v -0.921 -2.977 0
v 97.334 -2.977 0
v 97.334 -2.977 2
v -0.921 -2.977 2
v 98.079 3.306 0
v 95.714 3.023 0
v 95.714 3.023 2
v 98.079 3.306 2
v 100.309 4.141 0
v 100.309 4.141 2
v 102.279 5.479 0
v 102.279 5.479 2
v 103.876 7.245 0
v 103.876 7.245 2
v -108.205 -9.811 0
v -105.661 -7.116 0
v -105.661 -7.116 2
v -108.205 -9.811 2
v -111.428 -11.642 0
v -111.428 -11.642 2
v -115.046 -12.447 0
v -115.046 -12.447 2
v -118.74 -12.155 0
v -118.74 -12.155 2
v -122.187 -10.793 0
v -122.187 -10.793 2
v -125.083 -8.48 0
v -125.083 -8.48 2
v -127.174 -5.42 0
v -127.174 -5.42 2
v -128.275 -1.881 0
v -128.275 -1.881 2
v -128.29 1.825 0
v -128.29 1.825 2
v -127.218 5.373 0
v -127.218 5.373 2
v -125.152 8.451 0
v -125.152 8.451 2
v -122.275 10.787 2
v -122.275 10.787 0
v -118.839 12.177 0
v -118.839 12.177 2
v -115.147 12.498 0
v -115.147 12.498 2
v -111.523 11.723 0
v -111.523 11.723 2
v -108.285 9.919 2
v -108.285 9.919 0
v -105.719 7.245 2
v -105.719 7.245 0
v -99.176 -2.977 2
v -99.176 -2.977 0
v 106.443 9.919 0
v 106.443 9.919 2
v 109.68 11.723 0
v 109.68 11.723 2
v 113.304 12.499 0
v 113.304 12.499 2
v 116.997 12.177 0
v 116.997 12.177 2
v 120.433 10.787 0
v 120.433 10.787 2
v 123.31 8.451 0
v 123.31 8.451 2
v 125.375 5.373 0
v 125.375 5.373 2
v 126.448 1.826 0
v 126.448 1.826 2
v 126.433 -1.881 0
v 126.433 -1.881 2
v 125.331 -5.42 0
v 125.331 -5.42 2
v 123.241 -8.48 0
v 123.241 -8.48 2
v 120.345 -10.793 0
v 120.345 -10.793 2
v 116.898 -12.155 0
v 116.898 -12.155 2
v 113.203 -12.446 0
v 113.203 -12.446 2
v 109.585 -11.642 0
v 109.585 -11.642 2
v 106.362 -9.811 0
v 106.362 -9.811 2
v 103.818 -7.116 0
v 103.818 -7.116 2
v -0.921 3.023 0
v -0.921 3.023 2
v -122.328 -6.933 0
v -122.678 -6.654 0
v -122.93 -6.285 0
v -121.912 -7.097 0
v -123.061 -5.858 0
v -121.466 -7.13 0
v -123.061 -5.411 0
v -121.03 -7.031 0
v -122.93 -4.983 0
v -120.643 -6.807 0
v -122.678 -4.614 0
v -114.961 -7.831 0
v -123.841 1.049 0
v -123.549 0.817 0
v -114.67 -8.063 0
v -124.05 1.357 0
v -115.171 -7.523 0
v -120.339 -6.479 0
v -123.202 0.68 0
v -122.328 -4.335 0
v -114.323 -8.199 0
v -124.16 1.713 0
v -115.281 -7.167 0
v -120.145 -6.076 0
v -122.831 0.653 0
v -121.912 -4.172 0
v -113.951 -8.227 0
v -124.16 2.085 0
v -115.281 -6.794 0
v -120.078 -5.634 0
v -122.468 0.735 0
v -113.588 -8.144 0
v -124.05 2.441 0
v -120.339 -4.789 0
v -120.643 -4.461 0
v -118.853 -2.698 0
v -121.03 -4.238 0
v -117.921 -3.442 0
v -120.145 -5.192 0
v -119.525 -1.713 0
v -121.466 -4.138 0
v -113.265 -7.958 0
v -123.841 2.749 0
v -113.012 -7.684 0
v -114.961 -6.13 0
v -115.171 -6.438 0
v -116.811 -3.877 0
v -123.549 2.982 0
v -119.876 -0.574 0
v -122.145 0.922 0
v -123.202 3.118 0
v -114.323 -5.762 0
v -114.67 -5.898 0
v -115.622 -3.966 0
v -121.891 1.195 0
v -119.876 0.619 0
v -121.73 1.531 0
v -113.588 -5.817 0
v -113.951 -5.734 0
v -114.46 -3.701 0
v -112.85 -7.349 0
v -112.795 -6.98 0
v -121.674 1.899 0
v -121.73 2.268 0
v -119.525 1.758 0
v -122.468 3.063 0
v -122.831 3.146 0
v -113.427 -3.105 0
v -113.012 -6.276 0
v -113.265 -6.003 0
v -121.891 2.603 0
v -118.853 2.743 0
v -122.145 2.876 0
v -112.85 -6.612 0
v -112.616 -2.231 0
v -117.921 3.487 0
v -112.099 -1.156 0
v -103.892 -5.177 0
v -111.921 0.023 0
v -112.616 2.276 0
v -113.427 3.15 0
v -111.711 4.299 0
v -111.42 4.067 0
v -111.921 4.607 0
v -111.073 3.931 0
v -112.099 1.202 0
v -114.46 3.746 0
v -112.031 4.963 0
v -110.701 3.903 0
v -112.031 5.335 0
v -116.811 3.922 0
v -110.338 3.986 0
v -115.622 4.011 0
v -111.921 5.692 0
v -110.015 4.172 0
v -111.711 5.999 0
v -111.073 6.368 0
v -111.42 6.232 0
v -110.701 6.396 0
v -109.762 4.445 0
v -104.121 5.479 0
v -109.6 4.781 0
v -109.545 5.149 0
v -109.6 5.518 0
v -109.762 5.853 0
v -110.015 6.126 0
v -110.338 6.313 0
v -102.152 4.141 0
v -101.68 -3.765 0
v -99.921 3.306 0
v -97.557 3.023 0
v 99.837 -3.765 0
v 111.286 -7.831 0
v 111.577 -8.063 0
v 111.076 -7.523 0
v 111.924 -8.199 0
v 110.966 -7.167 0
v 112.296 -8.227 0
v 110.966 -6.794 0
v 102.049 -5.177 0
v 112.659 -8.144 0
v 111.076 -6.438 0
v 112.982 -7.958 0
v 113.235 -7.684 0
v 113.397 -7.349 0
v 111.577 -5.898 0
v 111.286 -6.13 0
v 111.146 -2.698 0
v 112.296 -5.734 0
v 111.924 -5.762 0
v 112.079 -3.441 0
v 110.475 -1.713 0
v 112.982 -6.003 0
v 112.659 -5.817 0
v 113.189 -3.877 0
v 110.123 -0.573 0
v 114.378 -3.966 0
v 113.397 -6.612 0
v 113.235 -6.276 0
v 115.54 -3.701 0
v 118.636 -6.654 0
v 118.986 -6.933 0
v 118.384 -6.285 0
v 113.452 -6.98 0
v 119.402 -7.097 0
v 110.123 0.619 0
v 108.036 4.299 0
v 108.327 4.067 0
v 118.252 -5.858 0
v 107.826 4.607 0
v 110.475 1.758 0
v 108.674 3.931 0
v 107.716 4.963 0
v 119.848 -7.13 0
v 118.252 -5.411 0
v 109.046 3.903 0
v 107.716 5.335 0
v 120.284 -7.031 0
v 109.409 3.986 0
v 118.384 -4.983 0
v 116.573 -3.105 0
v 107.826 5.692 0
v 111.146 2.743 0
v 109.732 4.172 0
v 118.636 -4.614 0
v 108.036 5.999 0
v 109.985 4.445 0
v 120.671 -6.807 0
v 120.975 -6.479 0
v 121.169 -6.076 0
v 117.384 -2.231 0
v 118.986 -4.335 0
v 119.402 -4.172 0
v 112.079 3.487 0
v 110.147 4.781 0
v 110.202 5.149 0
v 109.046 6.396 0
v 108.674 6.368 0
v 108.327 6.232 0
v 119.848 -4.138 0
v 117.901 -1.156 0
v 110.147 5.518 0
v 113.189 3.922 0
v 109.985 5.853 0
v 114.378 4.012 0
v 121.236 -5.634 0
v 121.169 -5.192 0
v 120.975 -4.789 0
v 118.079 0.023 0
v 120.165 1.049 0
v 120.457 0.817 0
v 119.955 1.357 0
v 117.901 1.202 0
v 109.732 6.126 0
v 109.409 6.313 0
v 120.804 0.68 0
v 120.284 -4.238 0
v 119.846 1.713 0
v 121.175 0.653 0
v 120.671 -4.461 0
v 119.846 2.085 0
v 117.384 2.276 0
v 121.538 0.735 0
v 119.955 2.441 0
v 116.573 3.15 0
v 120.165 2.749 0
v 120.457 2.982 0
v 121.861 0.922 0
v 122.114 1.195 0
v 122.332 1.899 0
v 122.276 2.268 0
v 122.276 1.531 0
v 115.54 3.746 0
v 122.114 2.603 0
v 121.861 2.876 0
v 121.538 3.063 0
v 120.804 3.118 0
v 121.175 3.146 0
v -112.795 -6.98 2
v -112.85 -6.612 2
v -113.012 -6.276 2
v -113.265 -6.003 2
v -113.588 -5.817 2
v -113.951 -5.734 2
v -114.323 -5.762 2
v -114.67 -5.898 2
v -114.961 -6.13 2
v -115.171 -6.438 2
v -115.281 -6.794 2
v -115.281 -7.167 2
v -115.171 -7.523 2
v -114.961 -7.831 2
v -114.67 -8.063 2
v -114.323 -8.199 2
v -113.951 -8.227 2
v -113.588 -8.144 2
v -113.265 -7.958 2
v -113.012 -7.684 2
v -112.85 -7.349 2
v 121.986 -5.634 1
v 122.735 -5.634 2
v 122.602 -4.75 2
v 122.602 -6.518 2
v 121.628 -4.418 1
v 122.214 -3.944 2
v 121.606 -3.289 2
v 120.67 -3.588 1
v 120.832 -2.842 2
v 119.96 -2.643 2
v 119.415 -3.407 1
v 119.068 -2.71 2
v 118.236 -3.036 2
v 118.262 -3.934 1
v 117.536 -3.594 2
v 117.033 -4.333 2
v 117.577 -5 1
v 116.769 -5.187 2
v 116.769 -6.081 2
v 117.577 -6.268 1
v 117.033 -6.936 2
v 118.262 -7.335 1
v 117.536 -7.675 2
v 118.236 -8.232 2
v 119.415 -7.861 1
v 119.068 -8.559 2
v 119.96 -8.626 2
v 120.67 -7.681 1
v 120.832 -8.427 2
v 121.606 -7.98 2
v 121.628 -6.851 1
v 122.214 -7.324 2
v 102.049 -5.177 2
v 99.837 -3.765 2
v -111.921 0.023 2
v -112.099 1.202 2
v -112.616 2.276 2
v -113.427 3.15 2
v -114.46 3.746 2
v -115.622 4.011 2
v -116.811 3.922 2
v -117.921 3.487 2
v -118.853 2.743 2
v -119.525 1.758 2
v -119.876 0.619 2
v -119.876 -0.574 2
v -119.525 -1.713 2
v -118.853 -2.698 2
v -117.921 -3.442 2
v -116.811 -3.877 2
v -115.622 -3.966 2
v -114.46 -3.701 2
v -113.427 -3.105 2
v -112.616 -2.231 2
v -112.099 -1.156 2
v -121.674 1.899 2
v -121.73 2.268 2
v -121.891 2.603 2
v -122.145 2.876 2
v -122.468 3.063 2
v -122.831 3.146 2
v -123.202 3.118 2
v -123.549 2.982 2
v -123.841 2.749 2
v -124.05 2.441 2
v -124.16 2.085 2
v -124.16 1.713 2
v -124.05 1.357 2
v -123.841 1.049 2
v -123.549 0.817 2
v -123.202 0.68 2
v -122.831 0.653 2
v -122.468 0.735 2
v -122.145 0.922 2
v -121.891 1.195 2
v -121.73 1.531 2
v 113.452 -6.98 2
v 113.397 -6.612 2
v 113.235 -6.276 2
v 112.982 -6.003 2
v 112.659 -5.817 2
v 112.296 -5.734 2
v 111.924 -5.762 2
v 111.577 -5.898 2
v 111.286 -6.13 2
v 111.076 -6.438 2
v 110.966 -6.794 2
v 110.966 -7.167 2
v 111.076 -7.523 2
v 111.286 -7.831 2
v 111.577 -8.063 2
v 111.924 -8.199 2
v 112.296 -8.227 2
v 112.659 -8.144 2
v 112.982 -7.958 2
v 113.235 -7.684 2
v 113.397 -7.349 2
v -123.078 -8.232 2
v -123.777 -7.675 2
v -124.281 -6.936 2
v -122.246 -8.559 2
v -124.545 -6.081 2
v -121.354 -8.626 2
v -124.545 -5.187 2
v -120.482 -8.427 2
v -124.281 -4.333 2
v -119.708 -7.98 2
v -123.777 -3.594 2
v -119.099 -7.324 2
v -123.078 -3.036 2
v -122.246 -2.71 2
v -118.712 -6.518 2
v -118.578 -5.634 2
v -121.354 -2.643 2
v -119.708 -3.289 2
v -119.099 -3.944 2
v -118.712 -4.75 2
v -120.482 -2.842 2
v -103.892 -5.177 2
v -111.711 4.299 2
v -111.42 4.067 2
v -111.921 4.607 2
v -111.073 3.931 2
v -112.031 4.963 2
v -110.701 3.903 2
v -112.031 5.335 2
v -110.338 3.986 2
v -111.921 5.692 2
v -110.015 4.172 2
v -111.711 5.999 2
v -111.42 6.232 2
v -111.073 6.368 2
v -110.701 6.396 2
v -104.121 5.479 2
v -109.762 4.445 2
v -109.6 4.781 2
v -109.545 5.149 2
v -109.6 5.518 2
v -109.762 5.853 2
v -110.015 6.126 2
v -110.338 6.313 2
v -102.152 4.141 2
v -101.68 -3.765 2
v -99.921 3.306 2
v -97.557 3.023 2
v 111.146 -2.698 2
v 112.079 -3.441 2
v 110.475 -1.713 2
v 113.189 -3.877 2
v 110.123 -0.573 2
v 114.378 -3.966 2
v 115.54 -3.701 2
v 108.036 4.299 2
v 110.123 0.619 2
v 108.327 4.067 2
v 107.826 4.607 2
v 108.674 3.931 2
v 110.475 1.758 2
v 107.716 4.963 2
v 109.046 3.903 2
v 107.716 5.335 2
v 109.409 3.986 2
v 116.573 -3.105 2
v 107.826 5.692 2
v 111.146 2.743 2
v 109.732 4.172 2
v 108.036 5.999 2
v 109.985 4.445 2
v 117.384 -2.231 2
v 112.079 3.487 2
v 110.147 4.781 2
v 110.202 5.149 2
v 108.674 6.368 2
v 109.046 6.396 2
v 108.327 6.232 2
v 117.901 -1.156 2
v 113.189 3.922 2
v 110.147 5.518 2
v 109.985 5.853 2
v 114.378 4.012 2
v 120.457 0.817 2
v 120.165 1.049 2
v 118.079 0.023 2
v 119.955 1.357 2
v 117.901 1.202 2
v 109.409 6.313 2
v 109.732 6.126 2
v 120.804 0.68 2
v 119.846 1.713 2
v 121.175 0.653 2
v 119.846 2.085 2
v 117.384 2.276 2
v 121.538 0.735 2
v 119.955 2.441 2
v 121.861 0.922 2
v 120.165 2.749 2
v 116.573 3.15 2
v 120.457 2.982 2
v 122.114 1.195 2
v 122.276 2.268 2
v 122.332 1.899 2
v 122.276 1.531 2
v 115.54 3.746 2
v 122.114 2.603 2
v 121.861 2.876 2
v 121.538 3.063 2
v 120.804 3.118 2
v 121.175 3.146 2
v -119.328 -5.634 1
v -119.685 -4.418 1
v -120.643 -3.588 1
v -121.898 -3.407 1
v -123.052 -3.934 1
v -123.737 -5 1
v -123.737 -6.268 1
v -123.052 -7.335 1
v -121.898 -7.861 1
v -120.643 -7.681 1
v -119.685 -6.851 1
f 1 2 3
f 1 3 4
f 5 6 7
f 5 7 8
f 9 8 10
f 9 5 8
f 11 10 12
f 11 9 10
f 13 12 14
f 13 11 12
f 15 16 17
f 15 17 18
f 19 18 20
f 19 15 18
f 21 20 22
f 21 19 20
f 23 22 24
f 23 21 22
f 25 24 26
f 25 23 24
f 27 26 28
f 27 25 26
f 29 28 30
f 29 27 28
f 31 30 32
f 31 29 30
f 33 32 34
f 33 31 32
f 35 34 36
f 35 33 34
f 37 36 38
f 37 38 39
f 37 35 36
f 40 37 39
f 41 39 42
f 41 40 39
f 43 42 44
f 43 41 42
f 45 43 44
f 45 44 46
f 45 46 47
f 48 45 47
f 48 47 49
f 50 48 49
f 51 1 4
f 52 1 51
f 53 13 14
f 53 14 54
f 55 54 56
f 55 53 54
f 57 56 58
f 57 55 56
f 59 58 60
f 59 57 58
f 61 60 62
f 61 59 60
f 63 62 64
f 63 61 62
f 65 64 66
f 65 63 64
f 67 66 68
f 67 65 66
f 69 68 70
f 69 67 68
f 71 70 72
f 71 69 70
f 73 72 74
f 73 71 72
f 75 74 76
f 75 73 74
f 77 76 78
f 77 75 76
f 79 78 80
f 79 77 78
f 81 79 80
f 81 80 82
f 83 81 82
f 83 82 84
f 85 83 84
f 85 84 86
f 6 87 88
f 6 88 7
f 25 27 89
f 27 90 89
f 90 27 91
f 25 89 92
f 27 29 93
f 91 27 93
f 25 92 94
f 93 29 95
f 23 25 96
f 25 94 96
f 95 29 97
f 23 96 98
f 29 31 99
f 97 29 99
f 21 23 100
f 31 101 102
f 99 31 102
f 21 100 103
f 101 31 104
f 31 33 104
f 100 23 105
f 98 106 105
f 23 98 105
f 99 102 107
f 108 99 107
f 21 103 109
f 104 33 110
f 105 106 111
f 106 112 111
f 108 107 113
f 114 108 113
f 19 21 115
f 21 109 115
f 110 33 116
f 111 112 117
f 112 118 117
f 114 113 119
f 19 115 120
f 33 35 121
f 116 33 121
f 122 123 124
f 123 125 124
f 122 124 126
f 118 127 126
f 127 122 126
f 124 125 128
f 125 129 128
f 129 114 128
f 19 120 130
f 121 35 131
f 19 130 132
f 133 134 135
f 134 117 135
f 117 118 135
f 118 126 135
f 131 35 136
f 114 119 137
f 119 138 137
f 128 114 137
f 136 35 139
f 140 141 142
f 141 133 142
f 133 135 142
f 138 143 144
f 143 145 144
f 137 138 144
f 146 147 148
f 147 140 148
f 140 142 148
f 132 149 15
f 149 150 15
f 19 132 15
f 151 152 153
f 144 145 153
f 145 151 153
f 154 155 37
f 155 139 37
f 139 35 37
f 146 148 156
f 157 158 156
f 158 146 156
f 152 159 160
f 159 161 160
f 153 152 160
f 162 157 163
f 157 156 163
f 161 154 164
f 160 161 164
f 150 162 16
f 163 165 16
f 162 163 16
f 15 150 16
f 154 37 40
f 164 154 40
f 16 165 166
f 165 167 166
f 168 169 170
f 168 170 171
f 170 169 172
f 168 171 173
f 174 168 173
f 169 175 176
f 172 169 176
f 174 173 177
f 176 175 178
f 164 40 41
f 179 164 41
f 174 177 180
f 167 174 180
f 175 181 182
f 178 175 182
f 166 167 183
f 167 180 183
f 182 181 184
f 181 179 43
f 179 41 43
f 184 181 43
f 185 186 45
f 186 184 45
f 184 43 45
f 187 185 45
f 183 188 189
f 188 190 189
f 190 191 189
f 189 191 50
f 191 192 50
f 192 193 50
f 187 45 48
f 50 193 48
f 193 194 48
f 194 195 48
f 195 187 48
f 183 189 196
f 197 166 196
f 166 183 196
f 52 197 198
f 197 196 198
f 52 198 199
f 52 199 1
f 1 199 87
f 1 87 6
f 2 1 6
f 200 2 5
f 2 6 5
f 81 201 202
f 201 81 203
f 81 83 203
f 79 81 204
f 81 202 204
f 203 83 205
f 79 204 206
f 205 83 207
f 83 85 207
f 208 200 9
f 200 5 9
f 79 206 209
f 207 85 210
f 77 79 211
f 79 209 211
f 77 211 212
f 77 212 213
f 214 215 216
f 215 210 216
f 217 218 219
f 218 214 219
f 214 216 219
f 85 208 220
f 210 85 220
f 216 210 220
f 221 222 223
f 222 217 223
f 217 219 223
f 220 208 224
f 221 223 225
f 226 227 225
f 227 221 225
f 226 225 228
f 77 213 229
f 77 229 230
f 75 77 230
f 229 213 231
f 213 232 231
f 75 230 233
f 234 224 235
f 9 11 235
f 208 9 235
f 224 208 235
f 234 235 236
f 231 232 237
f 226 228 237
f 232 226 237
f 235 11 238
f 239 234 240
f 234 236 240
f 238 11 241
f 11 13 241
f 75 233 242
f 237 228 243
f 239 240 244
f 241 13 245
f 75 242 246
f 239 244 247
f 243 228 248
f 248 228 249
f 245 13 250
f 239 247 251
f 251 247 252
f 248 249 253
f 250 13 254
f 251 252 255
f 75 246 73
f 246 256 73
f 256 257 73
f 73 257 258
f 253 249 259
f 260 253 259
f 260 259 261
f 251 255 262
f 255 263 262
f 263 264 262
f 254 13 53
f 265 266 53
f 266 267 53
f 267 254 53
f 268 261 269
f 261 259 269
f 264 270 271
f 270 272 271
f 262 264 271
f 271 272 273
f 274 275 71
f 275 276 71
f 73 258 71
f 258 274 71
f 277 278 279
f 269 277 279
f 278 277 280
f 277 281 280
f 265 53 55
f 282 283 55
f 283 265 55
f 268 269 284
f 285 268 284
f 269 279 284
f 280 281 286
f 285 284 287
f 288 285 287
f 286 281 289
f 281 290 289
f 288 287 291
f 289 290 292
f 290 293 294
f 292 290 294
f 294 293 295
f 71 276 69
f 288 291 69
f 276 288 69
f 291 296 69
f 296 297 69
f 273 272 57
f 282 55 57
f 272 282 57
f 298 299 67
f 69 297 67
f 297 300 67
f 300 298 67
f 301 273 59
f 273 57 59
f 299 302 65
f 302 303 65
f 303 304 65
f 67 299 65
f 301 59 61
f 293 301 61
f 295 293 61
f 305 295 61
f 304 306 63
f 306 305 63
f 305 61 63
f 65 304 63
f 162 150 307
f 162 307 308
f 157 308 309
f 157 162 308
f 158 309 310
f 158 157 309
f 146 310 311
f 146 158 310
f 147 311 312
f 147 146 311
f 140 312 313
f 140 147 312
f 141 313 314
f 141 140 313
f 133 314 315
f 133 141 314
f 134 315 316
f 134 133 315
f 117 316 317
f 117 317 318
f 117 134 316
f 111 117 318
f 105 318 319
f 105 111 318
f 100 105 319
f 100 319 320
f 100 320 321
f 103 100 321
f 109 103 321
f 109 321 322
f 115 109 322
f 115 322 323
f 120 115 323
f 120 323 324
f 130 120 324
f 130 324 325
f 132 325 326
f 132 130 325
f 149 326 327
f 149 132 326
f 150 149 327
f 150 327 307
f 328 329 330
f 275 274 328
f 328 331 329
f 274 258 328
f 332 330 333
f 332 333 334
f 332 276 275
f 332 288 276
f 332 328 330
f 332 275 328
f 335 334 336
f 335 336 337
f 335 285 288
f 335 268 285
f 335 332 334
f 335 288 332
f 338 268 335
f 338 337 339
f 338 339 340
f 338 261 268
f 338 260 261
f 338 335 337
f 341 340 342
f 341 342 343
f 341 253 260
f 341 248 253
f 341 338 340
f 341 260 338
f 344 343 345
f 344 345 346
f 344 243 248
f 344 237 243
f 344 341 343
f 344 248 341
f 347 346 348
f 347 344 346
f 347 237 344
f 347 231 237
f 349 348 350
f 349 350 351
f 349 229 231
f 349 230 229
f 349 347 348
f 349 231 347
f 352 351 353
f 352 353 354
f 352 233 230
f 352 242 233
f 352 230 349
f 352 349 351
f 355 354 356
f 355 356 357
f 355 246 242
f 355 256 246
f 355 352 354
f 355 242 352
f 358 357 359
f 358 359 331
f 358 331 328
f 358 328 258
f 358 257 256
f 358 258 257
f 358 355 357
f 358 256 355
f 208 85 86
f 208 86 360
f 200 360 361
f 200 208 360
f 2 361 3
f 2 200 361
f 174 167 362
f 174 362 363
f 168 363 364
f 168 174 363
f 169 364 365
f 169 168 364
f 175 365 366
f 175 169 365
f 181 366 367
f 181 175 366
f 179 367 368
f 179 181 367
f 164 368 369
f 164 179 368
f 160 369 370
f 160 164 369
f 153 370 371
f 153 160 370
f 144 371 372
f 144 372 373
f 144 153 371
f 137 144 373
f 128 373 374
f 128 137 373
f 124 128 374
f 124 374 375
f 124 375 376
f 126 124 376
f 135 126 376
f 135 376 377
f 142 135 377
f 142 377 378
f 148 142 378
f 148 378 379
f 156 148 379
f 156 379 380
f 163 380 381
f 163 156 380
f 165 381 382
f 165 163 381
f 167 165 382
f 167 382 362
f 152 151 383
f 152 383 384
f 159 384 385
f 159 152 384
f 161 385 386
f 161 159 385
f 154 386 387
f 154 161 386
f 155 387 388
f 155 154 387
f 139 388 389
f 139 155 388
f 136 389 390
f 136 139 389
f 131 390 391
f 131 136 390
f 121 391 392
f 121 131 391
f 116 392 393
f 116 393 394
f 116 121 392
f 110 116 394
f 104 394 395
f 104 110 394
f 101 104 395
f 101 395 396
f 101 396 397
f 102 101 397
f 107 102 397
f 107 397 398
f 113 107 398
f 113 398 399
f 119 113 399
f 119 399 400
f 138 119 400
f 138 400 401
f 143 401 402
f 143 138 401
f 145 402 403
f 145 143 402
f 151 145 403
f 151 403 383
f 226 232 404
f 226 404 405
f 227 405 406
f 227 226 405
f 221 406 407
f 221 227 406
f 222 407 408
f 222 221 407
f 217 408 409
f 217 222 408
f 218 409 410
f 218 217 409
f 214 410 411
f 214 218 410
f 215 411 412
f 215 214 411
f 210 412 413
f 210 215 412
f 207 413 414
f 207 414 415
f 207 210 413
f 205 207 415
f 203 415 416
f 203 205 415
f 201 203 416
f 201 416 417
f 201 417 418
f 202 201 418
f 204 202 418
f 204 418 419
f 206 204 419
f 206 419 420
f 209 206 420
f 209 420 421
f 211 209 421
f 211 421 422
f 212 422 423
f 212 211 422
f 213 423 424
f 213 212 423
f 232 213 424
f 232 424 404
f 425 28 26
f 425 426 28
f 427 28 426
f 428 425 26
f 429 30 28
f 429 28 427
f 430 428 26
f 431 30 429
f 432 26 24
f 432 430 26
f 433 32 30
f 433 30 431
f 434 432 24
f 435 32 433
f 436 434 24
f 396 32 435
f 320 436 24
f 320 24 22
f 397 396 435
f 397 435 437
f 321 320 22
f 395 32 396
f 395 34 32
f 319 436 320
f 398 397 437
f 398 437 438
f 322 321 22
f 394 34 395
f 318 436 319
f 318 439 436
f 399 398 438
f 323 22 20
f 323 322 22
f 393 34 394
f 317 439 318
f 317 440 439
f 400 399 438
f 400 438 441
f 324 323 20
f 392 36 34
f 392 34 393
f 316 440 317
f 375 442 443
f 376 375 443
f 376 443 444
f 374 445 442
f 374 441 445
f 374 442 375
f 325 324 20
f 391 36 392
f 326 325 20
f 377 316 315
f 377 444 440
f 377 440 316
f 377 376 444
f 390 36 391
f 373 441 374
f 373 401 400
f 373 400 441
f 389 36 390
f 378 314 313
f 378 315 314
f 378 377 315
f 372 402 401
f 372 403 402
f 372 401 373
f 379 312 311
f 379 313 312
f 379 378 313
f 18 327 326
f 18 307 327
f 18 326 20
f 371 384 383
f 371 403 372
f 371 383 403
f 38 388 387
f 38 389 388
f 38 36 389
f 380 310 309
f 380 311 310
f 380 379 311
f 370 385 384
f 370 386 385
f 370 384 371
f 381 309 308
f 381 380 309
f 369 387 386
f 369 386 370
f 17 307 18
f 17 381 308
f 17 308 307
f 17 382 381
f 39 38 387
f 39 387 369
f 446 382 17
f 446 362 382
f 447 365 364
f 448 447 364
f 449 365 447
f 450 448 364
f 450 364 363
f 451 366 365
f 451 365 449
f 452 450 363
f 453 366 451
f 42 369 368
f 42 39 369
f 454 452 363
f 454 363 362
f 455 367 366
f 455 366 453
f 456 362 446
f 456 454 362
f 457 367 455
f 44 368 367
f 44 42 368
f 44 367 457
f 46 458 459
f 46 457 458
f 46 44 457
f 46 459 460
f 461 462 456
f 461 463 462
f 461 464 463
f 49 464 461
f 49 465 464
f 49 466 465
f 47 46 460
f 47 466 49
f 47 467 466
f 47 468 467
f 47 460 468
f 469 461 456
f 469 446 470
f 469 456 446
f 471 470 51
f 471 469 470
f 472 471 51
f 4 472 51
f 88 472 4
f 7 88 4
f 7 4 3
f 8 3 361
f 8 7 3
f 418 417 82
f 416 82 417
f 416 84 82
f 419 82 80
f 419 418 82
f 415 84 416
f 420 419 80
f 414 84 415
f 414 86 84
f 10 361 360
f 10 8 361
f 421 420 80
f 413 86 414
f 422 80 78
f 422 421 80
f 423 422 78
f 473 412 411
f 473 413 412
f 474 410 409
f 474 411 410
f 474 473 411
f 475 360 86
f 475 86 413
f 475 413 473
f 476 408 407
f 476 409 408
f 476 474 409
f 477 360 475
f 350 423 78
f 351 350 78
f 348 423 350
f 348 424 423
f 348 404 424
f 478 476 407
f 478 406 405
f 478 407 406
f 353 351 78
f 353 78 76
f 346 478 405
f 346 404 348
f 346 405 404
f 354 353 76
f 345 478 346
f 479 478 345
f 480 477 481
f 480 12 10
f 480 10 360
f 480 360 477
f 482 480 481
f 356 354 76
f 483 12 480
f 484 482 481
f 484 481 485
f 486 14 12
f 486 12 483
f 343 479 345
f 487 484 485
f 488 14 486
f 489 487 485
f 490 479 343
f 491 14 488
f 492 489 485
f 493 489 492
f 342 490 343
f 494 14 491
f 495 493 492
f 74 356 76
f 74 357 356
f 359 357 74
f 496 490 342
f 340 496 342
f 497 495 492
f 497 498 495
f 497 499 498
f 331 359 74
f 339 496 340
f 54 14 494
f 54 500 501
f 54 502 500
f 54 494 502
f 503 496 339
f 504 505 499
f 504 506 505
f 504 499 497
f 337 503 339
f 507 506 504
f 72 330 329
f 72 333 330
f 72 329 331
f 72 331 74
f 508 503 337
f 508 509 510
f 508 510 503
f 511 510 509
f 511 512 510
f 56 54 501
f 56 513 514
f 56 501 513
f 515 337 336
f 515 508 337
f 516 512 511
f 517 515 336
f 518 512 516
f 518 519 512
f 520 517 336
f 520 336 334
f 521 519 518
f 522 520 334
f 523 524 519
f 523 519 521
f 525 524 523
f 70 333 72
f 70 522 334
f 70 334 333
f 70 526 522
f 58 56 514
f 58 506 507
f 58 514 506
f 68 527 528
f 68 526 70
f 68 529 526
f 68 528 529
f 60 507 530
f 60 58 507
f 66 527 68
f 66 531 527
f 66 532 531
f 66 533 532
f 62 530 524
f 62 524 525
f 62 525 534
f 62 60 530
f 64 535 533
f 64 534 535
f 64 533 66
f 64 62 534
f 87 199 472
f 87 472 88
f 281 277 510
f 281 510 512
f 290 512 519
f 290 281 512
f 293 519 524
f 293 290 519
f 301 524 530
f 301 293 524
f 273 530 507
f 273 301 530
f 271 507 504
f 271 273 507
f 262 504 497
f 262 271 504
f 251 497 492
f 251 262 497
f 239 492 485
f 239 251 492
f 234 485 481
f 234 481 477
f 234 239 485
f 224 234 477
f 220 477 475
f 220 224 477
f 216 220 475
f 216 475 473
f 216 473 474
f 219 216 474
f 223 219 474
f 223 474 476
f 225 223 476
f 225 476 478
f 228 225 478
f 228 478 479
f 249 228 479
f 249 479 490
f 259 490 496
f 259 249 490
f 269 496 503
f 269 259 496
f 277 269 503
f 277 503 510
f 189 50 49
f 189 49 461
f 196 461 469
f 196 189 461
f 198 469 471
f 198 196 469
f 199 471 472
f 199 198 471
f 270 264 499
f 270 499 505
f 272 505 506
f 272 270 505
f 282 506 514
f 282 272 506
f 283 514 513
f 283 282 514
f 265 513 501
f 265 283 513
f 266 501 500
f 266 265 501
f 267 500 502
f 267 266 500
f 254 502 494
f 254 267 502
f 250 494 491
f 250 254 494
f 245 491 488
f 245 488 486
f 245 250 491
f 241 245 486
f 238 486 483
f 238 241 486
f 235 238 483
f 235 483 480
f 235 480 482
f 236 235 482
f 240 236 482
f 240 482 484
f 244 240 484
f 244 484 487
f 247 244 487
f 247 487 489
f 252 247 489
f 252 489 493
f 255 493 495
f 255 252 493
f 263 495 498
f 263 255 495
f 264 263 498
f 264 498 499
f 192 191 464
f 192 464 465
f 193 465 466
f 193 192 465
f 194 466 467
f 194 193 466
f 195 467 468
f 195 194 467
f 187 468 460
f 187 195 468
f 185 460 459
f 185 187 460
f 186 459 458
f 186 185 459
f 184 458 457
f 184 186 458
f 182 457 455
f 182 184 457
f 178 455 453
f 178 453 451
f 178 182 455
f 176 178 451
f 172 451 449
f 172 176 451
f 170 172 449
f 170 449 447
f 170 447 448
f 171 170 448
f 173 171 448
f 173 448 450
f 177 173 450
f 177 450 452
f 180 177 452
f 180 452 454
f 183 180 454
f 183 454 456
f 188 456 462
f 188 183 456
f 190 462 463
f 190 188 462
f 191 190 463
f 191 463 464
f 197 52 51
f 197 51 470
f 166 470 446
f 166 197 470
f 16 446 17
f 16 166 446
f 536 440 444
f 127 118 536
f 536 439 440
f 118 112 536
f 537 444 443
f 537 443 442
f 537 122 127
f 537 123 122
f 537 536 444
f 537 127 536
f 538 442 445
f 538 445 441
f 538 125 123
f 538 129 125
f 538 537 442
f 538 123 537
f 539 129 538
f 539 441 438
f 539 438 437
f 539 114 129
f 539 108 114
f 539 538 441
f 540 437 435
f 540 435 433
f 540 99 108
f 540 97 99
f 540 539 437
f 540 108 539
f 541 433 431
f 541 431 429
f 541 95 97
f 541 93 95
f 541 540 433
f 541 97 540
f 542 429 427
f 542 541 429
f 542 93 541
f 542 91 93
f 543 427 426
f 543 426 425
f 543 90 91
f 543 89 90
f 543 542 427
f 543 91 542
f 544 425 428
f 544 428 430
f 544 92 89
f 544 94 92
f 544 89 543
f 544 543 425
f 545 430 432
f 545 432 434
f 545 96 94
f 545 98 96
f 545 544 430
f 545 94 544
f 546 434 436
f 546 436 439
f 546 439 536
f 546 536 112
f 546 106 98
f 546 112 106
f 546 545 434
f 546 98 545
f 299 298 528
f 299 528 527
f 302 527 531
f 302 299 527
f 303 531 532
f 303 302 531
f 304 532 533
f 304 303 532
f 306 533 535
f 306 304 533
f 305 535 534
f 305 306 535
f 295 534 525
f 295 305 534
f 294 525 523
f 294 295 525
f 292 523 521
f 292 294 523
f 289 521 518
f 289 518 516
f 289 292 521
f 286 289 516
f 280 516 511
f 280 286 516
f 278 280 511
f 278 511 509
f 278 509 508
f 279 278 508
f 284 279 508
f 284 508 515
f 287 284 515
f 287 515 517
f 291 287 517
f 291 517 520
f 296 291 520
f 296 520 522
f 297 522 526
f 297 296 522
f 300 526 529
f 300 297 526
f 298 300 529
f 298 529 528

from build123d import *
from OCP.BRepFilletAPI import BRepFilletAPI_MakeChamfer

# Parameters (mm, degrees)
SKETCH_1_R       = 3
SKETCH_1_R_2     = 4
SKETCH_1_R_3     = 1.25
SKETCH_1_R_4     = 1.5
EXTRUDE_1_DEPTH  = 2
CHAMFER_1_SIZE   = 1.5
CHAMFER_1_SIZE_2 = 2


with BuildPart() as part:
    # 草图1 → 凸台-拉伸1 (new body)
    # profile 1 of 3: a face of its own
    with BuildSketch(Plane.XY):
        with BuildLine():
            ThreePointArc((-105.718905787, 7.244728588), (-102.151651286, 4.140596435), (-97.556989056, 3.022553461))
            Line((-97.556989056, 3.022553461), (-0.921282848, 3.022639283))
            Line((-0.921282848, 3.022639283), (95.714423361, 3.022750547))
            ThreePointArc((95.714423361, 3.022750547), (100.30908331, 4.140802892), (103.87633148, 7.24494232))
            ThreePointArc((103.87633148, 7.24494232), (126.57834594, -0.028036342), (103.817957269, -7.116222762))
            ThreePointArc((103.817957269, -7.116222762), (100.989655875, -4.398243929), (97.333501186, -2.977247589))
            Line((97.333501186, -2.977247589), (-0.921276729, -2.977360717))
            Line((-0.921276729, -2.977360717), (-99.176054645, -2.977447977))
            ThreePointArc((-99.176054645, -2.977447977), (-102.832206436, -4.398451774), (-105.660502287, -7.116436375))
            ThreePointArc((-105.660502287, -7.116436375), (-128.420905414, -0.028296374), (-105.718905787, 7.244728588))
        make_face()
        with Locations((-121.57813209, -5.634211545)):
            Circle(SKETCH_1_R, mode=Mode.SUBTRACT)
        with Locations((-115.921163949, 0.022537151)):
            Circle(SKETCH_1_R_2, mode=Mode.SUBTRACT)
        with Locations((119.735576409, -5.634211545)):
            Circle(SKETCH_1_R, mode=Mode.SUBTRACT)
        with Locations((112.202284082, -6.980319536)):
            Circle(SKETCH_1_R_3, mode=Mode.SUBTRACT)
        with Locations((114.078604371, 0.022771691)):
            Circle(SKETCH_1_R_2, mode=Mode.SUBTRACT)
        with Locations((-110.794753677, 5.149166868)):
            Circle(SKETCH_1_R_3, mode=Mode.SUBTRACT)
        with Locations((-122.924240081, 1.899080781)):
            Circle(SKETCH_1_R_3, mode=Mode.SUBTRACT)
        with Locations((121.0816844, 1.899080781)):
            Circle(SKETCH_1_R_3, mode=Mode.SUBTRACT)
        with Locations((-114.044839764, -6.980319536)):
            Circle(SKETCH_1_R_3, mode=Mode.SUBTRACT)
        with Locations((108.952197996, 5.149166868)):
            Circle(SKETCH_1_R_3, mode=Mode.SUBTRACT)
    # profile 2 of 3: a face of its own
    with BuildSketch(Plane.XY):
        with Locations((-121.57813209, -5.634211545)):
            Circle(SKETCH_1_R)
        with Locations((-121.57813209, -5.634211545)):
            Circle(SKETCH_1_R_4, mode=Mode.SUBTRACT)
    # profile 3 of 3: a face of its own
    with BuildSketch(Plane.XY):
        with Locations((119.735576409, -5.634211545)):
            Circle(SKETCH_1_R)
        with Locations((119.735576409, -5.634211545)):
            Circle(SKETCH_1_R_4, mode=Mode.SUBTRACT)
    extrude(amount=EXTRUDE_1_DEPTH)

    # 倒角1
    chamfer_1_edges_1 = [part.edges().sort_by_distance(p)[0] for p in [
        (118.235576409, -5.634211545, 2),
    ]]
    chamfer_1_side_1 = [part.faces().sort_by_distance(p)[0] for p in [
        (118.205576409, -5.634211545, 2),
    ]]
    chamfer_1_edges_2 = [part.edges().sort_by_distance(p)[0] for p in [
        (-123.07813209, -5.634211545, 2),
    ]]
    chamfer_1_side_2 = [part.faces().sort_by_distance(p)[0] for p in [
        (-123.10813209, -5.634211545, 2),
    ]]
    chamfer_1 = BRepFilletAPI_MakeChamfer(part.part.solid().wrapped)
    for e in chamfer_1_edges_1:
        chamfer_1.Add(CHAMFER_1_SIZE - 0.0001, CHAMFER_1_SIZE_2 - 0.0001, e.wrapped, chamfer_1_side_1[0].wrapped)
    for e in chamfer_1_edges_2:
        chamfer_1.Add(CHAMFER_1_SIZE - 0.0001, CHAMFER_1_SIZE_2 - 0.0001, e.wrapped, chamfer_1_side_2[0].wrapped)
    add(Compound.cast(chamfer_1.Shape()), mode=Mode.REPLACE)  # a hair under: the kernel refuses the full size


solid = part.part
